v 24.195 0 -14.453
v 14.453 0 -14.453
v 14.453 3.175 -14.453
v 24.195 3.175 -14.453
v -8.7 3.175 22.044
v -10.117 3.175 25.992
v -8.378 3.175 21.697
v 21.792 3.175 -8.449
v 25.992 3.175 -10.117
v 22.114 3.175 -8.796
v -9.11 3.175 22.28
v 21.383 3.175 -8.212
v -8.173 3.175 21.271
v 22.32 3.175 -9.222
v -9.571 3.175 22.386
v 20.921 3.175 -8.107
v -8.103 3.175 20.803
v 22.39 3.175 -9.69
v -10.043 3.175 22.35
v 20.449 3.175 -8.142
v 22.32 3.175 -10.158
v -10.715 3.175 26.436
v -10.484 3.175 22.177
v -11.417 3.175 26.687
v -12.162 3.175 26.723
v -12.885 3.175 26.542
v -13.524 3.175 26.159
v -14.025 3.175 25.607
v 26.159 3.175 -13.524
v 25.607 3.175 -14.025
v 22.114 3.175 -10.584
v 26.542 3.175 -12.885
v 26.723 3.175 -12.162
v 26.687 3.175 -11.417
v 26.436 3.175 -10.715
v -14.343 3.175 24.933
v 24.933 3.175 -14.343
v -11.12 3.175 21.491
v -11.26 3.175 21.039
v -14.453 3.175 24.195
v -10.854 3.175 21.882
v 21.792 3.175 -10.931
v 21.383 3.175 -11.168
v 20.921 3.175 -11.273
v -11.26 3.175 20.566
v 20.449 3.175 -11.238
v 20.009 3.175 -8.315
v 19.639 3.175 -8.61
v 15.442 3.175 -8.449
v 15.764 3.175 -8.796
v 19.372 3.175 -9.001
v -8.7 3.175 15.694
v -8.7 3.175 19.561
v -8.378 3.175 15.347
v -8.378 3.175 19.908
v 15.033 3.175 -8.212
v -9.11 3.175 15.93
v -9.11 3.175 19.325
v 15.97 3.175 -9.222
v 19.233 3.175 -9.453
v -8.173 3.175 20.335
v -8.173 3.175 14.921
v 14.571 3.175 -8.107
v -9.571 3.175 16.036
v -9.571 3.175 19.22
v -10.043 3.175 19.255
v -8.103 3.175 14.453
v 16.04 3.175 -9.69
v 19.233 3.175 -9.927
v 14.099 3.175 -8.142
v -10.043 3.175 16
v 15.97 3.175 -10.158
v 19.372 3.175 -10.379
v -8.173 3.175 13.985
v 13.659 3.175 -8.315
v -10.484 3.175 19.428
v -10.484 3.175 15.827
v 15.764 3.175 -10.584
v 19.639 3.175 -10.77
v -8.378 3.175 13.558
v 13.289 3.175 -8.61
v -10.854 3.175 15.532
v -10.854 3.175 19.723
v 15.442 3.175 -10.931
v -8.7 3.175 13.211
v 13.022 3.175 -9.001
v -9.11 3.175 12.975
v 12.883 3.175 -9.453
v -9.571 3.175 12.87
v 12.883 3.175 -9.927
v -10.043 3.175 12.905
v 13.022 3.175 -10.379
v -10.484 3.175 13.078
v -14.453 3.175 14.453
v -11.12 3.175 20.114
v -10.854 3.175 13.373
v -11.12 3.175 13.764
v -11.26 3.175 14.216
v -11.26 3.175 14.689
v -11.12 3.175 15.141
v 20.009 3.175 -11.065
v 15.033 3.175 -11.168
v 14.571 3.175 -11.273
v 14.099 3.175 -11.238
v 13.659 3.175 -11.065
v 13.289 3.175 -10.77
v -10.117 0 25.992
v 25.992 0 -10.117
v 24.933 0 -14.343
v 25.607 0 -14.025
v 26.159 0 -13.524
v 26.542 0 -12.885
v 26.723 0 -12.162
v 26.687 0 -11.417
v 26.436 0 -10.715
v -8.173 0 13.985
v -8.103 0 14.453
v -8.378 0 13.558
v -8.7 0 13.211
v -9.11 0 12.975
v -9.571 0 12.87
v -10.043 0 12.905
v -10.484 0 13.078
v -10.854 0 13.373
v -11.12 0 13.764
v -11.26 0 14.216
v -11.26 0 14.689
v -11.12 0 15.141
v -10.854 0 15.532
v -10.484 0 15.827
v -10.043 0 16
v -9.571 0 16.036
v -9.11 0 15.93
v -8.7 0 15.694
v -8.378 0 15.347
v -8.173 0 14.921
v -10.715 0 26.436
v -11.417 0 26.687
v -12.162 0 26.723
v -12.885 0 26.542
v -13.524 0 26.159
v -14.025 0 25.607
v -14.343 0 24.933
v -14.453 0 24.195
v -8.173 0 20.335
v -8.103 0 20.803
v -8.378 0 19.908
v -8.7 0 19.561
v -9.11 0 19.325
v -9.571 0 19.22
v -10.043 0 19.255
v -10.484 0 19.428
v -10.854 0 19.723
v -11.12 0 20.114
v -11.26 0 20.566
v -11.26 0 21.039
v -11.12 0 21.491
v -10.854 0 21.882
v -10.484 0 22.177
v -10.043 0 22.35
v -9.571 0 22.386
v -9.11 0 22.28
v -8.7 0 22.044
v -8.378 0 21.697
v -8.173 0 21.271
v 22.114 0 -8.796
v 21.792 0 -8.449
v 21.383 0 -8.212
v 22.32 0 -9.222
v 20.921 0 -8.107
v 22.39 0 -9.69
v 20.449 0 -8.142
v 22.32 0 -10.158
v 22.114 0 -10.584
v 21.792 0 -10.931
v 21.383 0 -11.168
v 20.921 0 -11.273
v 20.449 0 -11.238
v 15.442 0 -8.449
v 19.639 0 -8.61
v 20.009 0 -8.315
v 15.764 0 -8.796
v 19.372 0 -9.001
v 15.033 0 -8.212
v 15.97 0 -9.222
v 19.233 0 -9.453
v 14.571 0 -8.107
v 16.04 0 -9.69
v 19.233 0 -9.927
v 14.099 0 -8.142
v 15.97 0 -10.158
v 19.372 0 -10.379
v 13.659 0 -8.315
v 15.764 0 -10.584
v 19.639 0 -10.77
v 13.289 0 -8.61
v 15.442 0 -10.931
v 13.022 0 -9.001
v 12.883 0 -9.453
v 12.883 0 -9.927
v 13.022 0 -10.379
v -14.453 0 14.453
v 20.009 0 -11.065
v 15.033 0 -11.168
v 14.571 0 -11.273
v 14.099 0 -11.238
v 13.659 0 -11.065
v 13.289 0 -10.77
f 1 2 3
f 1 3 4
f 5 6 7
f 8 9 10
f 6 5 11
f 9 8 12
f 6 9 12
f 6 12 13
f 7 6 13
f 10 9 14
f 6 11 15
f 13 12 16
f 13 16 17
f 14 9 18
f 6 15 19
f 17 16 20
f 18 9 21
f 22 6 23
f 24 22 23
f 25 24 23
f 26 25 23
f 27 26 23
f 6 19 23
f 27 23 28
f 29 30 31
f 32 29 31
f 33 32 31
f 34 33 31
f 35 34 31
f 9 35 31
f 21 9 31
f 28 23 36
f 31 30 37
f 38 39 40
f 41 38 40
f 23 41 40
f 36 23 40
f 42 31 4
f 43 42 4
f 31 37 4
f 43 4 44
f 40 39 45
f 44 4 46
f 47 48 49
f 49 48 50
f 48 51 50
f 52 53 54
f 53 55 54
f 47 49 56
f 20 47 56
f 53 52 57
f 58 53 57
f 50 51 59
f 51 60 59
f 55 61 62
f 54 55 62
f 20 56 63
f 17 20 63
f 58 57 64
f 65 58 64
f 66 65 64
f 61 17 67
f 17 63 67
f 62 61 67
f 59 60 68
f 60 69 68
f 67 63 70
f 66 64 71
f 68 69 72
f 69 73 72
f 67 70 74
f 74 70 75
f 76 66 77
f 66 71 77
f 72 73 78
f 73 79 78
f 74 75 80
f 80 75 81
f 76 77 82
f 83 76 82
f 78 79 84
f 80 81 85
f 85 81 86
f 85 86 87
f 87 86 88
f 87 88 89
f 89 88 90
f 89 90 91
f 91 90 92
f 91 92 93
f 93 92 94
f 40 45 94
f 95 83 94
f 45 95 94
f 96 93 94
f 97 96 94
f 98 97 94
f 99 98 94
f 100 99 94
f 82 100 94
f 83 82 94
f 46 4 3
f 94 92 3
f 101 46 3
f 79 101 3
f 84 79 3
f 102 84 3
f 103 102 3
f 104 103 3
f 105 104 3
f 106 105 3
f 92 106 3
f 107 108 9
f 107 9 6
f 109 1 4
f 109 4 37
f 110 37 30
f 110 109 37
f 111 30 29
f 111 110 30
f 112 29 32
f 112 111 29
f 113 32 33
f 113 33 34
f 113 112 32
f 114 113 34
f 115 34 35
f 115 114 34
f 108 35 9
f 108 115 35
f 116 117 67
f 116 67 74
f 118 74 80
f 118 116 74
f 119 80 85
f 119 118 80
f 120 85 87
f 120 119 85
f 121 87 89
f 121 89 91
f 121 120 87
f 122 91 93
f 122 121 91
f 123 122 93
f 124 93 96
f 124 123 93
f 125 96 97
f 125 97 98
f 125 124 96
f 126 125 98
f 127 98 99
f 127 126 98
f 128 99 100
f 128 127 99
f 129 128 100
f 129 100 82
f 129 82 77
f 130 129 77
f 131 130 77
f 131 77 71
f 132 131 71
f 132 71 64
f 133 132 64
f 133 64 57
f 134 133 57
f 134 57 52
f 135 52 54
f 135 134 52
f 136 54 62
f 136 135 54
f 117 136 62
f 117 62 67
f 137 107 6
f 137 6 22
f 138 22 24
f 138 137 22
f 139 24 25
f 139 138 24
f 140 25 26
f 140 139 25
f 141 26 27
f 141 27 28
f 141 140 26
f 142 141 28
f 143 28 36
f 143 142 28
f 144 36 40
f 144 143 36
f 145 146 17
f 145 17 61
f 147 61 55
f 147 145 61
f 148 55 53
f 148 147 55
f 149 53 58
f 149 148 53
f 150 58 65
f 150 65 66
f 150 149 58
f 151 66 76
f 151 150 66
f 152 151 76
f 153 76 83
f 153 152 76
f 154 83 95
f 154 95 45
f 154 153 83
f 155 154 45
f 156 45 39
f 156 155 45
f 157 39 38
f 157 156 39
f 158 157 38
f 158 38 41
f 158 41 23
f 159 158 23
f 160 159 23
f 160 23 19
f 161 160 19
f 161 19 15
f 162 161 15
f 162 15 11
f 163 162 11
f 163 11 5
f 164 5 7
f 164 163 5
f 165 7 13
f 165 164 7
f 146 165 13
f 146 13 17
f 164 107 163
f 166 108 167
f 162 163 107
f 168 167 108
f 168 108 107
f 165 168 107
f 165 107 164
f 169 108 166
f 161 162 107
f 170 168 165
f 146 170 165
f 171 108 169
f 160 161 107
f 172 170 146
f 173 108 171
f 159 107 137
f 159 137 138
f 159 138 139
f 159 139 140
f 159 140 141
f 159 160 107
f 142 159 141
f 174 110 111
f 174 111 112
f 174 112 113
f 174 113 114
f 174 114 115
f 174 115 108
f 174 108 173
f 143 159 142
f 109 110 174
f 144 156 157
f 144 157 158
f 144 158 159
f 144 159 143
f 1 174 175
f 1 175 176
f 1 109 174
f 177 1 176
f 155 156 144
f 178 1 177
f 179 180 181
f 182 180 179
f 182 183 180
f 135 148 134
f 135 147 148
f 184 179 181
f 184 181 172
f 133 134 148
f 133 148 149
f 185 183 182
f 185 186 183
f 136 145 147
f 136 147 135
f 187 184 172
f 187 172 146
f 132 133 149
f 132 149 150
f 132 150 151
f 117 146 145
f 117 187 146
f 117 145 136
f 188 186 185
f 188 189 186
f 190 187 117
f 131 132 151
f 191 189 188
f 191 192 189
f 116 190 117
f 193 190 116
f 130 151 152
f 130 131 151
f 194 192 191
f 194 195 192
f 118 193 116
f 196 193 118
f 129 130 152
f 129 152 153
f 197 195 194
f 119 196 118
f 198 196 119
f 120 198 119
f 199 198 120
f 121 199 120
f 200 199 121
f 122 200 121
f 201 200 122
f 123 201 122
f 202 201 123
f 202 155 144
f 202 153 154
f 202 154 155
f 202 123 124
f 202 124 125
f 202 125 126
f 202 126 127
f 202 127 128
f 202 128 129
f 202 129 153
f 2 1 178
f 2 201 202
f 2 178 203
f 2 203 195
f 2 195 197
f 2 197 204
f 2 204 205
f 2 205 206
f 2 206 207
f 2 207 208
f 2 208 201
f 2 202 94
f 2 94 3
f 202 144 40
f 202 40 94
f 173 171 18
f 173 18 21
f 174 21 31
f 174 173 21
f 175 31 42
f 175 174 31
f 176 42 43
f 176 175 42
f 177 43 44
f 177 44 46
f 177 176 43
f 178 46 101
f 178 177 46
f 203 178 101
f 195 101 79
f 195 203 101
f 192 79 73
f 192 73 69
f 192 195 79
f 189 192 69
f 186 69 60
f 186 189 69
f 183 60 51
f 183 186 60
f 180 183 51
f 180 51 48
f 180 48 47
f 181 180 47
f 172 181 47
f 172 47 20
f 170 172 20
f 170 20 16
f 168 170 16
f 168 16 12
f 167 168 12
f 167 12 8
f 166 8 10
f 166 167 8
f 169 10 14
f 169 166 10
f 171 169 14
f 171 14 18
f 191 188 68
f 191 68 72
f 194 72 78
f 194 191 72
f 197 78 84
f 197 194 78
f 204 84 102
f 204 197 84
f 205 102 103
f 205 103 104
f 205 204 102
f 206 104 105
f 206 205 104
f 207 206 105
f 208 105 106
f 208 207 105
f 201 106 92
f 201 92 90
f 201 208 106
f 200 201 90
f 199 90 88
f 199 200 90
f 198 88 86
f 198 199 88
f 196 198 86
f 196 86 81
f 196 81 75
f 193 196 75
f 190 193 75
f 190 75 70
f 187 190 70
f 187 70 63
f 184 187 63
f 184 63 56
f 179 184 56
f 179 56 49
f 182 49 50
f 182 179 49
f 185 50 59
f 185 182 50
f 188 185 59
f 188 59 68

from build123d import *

# Parameters (mm, degrees)
SKETCH1_R           = 1.5875
BOSS_EXTRUDE1_DEPTH = 3.175


with BuildPart() as part:
    # Sketch1 → Boss-Extrude1 (new body)
    with BuildSketch(Plane(origin=(0, 0, 0), x_dir=(1, 0, 0), z_dir=(0, 1, 0))):
        with BuildLine():
            Line((-14.452594388, -14.452594388), (14.452594388, 14.452594388))
            Line((14.452594388, 14.452594388), (24.19549194, 14.452594388))
            ThreePointArc((24.19549194, 14.452594388), (26.542145952, 12.884610306), (25.991543164, 10.116543164))
            Line((25.991543164, 10.116543164), (-10.116543164, -25.991543164))
            ThreePointArc((-10.116543164, -25.991543164), (-12.884610306, -26.542145952), (-14.452594388, -24.19549194))
            Line((-14.452594388, -24.19549194), (-14.452594388, -14.452594388))
        make_face()
        with Locations((-9.690094388, -14.452594388)):
            Circle(SKETCH1_R, mode=Mode.SUBTRACT)
        with Locations((-9.690094388, -20.802594388)):
            Circle(SKETCH1_R, mode=Mode.SUBTRACT)
        with Locations((20.802594388, 9.690094388)):
            Circle(SKETCH1_R, mode=Mode.SUBTRACT)
        with Locations((14.452594388, 9.690094388)):
            Circle(SKETCH1_R, mode=Mode.SUBTRACT)
    extrude(amount=BOSS_EXTRUDE1_DEPTH)


solid = part.part
